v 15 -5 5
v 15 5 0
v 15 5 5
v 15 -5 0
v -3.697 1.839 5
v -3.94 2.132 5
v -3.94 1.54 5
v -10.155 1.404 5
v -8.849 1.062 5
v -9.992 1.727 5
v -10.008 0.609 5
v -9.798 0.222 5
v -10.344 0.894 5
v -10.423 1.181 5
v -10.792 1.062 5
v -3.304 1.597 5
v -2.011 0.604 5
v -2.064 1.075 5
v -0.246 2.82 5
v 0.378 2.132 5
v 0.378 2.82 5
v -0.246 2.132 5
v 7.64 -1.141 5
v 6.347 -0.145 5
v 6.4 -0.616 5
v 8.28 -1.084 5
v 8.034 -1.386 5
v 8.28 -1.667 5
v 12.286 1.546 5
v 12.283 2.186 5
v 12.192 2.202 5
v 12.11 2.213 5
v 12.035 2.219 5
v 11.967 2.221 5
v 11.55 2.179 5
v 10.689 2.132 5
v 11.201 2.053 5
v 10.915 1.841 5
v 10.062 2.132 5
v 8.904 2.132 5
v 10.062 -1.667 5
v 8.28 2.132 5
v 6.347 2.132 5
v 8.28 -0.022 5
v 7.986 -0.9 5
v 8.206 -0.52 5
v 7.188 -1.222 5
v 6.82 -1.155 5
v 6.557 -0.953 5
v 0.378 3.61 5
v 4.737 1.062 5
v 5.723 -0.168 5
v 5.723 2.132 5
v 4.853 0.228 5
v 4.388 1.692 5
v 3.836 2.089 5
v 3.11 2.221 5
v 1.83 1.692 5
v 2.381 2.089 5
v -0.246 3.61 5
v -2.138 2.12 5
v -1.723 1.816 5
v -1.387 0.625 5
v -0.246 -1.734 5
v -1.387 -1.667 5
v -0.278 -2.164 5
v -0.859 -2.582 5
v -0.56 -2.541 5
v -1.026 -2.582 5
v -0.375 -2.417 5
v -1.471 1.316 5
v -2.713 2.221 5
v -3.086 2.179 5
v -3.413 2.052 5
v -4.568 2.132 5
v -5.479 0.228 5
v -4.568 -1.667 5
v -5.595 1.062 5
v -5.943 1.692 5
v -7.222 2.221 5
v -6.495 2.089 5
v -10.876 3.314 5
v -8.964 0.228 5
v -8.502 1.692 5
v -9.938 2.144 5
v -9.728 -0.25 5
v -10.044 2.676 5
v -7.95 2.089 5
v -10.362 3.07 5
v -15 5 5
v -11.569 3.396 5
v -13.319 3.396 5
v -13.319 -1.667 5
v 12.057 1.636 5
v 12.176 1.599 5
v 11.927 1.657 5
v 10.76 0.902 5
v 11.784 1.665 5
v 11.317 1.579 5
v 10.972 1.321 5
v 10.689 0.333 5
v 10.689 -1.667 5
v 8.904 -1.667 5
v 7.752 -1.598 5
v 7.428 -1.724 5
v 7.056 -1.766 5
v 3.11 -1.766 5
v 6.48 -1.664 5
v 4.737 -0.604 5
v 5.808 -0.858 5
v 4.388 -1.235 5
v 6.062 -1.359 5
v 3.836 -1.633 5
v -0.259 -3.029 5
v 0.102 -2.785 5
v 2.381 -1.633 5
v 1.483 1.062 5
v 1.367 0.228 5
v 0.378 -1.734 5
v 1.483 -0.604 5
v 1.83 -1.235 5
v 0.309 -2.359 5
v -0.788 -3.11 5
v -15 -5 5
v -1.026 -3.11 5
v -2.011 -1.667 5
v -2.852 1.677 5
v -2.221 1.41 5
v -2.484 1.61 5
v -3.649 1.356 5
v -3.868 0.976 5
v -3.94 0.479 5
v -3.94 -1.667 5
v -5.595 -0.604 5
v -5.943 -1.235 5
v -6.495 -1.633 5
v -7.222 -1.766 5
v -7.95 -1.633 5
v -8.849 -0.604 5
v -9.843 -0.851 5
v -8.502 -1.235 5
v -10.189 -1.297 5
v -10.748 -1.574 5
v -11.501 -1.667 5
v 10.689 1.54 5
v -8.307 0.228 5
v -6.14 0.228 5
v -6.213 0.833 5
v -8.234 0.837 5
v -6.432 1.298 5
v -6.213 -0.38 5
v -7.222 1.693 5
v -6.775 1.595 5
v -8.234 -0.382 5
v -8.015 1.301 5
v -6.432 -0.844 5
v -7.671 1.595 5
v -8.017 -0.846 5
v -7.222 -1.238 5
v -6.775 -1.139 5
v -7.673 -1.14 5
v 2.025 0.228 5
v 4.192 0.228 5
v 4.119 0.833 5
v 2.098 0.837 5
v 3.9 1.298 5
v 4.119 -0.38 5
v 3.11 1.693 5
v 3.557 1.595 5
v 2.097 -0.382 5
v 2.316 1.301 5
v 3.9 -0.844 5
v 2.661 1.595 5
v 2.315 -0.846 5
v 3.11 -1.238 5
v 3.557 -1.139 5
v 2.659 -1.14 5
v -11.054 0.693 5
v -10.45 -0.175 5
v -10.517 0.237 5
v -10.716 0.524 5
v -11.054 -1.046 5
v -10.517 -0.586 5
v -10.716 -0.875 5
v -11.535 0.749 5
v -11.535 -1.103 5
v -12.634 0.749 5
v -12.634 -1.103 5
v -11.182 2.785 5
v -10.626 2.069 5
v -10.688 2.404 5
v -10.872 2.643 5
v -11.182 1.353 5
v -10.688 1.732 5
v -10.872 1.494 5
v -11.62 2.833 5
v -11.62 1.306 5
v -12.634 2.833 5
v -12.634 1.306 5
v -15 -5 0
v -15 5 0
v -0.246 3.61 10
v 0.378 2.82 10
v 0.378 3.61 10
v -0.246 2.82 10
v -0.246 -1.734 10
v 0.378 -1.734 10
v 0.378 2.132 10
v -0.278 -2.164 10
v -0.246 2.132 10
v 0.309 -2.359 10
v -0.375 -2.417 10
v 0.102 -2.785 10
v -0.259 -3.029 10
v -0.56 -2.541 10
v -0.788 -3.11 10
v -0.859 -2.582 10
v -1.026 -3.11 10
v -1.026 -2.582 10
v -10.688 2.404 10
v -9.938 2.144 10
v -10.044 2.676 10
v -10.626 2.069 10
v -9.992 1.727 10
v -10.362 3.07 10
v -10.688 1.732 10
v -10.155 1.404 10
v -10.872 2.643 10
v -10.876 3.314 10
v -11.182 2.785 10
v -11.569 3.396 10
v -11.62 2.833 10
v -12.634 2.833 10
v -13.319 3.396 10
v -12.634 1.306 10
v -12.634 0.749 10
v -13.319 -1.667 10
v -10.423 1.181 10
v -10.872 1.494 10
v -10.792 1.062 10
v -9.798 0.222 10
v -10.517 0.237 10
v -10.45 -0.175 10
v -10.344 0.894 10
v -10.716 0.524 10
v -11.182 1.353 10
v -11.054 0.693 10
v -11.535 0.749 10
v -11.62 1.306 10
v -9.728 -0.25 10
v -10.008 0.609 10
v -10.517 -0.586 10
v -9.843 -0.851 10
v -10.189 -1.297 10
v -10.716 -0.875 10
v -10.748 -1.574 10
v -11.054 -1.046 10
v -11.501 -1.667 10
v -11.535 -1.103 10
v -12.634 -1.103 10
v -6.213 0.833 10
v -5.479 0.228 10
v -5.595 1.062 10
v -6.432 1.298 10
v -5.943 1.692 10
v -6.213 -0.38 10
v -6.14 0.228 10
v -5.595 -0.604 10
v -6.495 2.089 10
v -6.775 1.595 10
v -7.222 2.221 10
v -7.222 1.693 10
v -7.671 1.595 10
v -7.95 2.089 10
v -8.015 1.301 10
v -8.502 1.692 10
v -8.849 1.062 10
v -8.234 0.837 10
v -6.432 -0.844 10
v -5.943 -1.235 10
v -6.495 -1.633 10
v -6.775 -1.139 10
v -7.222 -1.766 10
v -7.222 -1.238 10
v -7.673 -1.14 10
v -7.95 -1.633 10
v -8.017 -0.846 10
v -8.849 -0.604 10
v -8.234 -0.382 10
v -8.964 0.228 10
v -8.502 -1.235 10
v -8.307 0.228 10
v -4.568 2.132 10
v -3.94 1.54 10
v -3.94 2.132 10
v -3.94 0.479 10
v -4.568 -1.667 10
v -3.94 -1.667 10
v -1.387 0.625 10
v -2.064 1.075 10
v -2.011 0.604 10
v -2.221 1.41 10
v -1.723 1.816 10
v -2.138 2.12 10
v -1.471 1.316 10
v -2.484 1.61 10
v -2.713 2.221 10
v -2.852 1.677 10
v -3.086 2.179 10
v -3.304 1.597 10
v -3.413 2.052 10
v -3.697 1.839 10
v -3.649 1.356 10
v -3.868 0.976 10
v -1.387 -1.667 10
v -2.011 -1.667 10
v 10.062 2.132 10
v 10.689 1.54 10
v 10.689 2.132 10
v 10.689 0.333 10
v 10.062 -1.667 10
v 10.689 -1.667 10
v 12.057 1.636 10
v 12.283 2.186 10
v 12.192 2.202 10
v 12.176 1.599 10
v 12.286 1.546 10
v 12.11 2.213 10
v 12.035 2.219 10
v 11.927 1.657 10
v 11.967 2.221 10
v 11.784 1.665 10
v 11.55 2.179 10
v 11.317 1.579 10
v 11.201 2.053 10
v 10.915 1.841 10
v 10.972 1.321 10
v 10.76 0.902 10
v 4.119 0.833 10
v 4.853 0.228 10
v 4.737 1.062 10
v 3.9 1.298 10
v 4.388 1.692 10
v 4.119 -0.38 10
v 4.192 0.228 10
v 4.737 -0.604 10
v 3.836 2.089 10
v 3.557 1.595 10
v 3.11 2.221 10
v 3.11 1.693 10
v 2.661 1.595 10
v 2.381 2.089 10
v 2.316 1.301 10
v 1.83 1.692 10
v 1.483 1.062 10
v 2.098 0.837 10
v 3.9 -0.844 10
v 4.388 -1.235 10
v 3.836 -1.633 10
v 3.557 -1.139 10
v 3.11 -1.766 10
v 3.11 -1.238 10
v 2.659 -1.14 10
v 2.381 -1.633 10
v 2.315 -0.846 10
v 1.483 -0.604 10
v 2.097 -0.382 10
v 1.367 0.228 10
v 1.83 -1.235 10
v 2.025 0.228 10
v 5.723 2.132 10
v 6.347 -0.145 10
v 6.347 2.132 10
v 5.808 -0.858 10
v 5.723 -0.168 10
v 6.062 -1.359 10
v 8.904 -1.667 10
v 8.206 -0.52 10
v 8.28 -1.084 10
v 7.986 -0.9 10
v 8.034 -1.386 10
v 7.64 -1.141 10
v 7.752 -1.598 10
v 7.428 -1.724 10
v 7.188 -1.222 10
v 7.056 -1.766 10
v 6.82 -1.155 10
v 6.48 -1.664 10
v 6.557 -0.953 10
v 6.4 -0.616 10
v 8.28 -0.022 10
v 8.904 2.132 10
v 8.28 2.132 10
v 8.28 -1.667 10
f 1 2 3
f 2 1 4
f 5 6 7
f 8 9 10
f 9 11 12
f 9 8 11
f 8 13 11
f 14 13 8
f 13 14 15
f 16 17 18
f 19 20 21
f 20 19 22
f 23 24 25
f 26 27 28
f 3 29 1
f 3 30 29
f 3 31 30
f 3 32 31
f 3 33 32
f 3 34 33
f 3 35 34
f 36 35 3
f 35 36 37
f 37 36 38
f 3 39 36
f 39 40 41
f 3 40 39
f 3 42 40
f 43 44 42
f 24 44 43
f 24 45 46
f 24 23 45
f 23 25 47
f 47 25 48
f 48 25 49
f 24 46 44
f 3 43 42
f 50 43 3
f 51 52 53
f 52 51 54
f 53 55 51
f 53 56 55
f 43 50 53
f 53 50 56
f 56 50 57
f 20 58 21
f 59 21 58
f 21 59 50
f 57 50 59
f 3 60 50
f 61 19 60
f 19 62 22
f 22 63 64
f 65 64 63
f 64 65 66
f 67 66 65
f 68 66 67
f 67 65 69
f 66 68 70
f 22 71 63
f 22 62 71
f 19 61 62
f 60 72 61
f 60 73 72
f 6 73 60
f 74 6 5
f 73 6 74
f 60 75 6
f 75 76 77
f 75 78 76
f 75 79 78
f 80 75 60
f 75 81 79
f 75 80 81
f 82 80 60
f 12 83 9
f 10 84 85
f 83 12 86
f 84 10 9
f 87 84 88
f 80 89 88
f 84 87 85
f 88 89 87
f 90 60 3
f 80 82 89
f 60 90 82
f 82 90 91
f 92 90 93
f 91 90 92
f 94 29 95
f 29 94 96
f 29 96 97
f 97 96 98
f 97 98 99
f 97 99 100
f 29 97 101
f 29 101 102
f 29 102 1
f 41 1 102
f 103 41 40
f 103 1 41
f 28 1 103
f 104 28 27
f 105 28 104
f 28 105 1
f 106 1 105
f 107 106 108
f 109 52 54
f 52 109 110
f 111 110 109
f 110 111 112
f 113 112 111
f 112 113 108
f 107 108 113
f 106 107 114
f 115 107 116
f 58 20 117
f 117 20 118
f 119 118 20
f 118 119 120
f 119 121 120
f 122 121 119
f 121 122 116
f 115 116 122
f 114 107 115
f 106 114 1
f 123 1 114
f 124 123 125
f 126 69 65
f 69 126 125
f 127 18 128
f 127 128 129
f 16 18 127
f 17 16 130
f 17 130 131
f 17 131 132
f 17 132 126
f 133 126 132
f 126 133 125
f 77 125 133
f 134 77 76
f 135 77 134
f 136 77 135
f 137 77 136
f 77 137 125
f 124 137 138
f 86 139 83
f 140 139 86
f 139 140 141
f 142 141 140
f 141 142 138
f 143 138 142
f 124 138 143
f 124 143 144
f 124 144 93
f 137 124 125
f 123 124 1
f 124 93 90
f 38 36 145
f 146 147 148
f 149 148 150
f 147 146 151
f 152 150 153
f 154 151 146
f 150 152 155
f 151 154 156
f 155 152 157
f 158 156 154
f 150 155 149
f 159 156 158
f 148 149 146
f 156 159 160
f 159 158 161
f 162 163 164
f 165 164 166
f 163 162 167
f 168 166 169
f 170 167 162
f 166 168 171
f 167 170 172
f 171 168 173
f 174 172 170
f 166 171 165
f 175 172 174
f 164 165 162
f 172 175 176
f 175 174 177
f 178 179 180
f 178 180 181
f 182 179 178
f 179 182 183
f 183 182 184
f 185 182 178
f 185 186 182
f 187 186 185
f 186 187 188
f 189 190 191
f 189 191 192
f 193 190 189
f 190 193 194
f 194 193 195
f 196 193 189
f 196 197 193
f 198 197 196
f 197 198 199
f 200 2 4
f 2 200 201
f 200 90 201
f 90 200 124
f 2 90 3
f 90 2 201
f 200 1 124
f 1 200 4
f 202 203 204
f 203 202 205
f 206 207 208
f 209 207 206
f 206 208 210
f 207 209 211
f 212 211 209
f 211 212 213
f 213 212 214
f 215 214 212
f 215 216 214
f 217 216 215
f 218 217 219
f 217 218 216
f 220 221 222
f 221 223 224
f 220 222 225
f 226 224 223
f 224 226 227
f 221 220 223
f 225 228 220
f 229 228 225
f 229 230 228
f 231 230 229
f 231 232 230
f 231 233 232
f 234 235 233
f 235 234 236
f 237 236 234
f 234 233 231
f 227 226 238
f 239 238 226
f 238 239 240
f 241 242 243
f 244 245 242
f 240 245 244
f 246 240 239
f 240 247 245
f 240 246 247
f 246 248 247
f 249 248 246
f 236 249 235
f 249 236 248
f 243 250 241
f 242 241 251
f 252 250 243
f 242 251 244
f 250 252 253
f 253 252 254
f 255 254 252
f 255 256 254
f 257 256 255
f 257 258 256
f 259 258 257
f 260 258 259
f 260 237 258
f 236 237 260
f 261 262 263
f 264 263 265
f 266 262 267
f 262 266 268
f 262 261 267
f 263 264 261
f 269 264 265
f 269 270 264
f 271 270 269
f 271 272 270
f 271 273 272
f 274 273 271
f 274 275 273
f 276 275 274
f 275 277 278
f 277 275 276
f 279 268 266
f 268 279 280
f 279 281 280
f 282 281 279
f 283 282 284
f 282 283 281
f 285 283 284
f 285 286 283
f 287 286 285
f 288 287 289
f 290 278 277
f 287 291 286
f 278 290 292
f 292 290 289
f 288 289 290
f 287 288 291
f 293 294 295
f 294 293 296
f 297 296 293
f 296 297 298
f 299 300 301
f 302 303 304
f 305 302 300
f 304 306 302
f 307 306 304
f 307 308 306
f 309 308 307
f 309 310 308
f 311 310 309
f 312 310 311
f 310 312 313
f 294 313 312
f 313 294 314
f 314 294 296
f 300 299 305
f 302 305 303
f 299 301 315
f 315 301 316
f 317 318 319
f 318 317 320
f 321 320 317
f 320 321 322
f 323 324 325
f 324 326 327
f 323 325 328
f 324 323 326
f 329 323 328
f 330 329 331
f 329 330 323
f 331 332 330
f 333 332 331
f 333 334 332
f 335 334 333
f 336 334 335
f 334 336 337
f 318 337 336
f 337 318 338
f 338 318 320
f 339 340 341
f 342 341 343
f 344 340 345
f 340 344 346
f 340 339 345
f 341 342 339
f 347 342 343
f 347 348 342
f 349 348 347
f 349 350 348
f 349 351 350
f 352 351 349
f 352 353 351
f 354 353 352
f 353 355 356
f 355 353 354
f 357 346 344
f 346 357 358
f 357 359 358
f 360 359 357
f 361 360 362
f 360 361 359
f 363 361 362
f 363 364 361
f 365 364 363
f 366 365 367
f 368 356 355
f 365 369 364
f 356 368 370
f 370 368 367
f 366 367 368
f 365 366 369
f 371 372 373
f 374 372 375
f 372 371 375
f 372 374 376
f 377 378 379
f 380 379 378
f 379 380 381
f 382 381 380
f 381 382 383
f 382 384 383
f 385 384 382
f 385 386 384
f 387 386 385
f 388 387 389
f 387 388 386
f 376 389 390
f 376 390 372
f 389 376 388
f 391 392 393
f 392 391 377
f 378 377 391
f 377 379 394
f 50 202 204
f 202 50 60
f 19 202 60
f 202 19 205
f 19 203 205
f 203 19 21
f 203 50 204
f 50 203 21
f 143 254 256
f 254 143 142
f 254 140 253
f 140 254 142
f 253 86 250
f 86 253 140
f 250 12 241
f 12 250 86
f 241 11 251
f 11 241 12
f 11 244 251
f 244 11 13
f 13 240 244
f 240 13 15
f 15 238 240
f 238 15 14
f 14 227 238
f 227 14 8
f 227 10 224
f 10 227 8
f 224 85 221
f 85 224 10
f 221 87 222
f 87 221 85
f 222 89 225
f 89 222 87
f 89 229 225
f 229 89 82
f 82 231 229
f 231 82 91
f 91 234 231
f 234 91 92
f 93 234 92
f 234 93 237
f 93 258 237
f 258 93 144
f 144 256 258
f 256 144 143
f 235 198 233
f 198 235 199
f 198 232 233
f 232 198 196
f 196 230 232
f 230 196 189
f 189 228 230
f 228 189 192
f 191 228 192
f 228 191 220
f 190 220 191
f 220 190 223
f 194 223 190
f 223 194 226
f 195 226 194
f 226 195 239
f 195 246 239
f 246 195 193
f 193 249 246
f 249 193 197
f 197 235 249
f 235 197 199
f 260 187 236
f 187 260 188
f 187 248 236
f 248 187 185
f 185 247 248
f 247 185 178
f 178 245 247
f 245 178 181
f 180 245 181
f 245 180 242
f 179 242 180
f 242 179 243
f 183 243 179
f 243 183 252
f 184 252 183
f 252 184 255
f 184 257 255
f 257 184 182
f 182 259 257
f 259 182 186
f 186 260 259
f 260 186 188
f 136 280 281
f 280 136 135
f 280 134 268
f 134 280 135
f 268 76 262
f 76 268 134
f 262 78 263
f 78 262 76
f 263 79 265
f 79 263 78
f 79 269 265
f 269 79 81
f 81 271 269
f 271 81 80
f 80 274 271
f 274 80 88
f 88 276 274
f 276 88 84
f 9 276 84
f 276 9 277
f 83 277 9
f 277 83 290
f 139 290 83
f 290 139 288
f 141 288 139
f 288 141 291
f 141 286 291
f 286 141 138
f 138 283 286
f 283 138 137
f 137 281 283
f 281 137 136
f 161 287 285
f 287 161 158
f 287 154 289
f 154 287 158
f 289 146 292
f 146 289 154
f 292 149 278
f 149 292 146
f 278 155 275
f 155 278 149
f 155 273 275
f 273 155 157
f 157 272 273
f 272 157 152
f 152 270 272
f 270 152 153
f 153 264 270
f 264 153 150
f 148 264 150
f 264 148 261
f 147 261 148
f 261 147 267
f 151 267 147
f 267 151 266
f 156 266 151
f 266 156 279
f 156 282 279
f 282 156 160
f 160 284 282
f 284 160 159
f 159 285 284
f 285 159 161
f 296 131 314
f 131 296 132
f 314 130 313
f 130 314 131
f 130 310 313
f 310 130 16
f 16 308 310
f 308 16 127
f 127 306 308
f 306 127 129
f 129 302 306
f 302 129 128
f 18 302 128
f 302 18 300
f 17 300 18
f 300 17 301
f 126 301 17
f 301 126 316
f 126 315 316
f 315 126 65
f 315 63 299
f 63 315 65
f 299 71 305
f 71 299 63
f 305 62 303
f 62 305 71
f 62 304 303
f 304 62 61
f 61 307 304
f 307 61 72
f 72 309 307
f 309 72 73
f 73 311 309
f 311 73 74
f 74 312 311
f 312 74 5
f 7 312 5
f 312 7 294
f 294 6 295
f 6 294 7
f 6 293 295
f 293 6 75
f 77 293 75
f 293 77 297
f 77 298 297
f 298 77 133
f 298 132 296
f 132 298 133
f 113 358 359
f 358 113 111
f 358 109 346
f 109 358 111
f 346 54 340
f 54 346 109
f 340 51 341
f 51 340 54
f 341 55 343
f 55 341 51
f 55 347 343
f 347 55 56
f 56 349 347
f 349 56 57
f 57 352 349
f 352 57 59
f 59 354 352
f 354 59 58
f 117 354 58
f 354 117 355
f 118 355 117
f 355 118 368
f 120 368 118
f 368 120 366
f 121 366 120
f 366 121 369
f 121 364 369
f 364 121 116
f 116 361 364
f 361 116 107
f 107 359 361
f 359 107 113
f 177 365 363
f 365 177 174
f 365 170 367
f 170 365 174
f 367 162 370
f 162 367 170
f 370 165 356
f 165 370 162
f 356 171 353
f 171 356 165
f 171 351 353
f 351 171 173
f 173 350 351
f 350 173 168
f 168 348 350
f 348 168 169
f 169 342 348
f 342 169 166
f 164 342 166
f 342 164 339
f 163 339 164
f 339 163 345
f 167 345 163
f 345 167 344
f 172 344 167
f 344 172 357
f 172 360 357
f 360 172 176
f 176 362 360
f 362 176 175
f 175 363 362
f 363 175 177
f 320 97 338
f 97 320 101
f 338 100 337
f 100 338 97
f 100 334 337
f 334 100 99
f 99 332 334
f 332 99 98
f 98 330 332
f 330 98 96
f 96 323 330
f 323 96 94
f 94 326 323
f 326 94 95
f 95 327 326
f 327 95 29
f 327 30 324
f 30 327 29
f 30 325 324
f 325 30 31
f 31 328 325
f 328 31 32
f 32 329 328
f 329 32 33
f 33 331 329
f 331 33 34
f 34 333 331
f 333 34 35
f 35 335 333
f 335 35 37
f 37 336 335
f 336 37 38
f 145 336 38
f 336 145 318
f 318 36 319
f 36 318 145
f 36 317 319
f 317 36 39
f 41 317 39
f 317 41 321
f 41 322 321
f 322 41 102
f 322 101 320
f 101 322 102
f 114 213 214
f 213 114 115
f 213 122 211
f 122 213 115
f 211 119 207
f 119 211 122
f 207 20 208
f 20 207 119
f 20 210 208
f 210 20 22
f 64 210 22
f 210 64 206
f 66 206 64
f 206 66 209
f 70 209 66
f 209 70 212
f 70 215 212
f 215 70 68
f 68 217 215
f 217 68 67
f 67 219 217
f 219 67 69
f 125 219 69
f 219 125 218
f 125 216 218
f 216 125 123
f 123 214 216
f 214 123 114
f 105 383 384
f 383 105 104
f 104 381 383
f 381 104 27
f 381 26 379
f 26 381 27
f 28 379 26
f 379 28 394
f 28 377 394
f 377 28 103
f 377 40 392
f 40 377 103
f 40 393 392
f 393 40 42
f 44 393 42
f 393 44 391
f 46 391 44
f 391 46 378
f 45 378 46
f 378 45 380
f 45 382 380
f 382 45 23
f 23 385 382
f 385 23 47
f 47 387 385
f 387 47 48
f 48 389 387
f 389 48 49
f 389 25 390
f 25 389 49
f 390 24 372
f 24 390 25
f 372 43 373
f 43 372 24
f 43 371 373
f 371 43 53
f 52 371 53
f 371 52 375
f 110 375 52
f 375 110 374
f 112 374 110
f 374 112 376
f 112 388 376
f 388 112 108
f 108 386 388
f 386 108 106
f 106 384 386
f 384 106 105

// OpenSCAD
$fn = 3; 
texte_a_inserer = "Bonjour"; 
taille = 5; 
police = "DejaVuSans"; //[[Abril Fatface,Aclonica,Acme,Advent Pro,Akronim,Aladin,Alegreya,Alegreya Sans,Alegreya SC,Alex Brush,Alfa Slab One,Alice,Amaranth,Architects Daughter,Archivo Black,Archivo Narrow,Arimo,Arvo,Asap,Astloch,Asul,Averia Libre,Averia Serif Libre,Bangers,Basic,Belgrano,Berkshire Swash,Bigshot One,Bilbo Swash Caps,Black Ops One,Bonbon,Bowlby One SC,Brawler,Bubblegum Sans,Butterfly Kids,Cabin Condensed,Caesar Dressing,Cagliostro,Calligraffitti,Capriola,Carter One,Changa One,Chango,Chelsea Market,Cherry Cream Soda,Chewy,Chicle,Chivo,Clicker Script,Coming Soon,Concert One,Condiment,Cookie,Courgette,Covered By Your Grace,Crimson Text,Dancing Script,DejaVu Sans,DejaVu Serif,Dhurjati,Doppio One,Dosis,Droid Sans,Eagle Lake,Electrolize,Emilys Candy,Encode Sans,Encode Sans Compressed,Euphoria Script,Exo,Exo 2,Faster One,Federo,Finger Paint,Fjord One,Fontdiner Swanky,Freckle Face,Fruktur,Gabriela,Geo,Germania One,Give You Glory,Gloria Hallelujah,Goudy Bookletter 1911,Graduate,Grand Hotel,Great Vibes,Griffy,Hanalei Fill,Happy Monkey,Henny Penny,Hind,IM Fell English SC,Indie Flower,Irish Grover,Italianno,Jacques Francois Shadow,Jolly Lodger,Josefin Slab,Joti One,Judson,Just Another Hand,Kalam,Kameron,Karma,Kavoon,Knewave,Kranky,Kristi,Laila,Lakki Reddy,Lancelot,Lato,Leckerli One,Ledger,Lekton,Lemon One,Liberation Sans,Libre Caslon Text,Life Savers,Lilita One,Lily Script One,Limelight,Lobster,Lobster Two,Londrina Outline,Londrina Shadow,Londrina Solid,Lora,Love Ya Like A Sister,Loved by the King,Lovers Quarrel,Luckiest Guy,Lusitana,Macondo,Macondo Swash Caps,Mako,Marck Script,Margarine,Marko One,Maven Pro,McLaren,MedievalSharp,Merienda One,Merriweather,Mervale Script,Metal Mania,Metrophobic,Milonga,Miltonian Tattoo,Miss Fajardose,Molle,Montez,Montserrat,Mr De Haviland,Mystery Quest,Neucha,New Rocker,Niconne,Nosifer,Nothing You Could Do,Noto Sans Oriya,Noto Serif,Nova Square,Nunito,Old Standard TT,Oleo Script,Oleo Script Swash Caps,Orbitron,Oregano,Orienta,Original Surfer,Oswald,Over the Rainbow,Overlock,Oxygen,Pacifico,Paprika,Parisienne,Patrick Hand SC,Paytone One,Peralta,Permanent Marker,Piedra,Pirata One,Play,Playball,Poetsen One,Poppins,Press Start 2P,Princess Sofia,PT Mono,Qwigley,Racing Sans One,Raleway,Rancho,Ranga,Ribeye,Roboto,Roboto Condensed,Roboto Slab,Rochester,Rock Salt,Rubik One,Sail,Salsa,Sansita One,Sarina,Satisfy,Schoolbell,Seaweed Script,Sevillana,Shadows Into Light,Shadows Into Light Two,Share,Six Caps,Skranji,Source Sans Pro,Spicy Rice,Stardos Stencil,Stoke,Syncopate,Teko,Terminal Dosis,The Girl Next Door,Tillana,Timmana,Titillium Web,Ubuntu,Ultra,Underdog,UnifrakturCook,UnifrakturMaguntia,Vampiro One,Vidaloka,Viga,Voces,Volkhov,Vollkorn,Voltaire,Waiting for the Sunrise,Wallpoet,Wellfleet,Wendy One,Yellowtail,Yesteryear,Zeyada]]
hauteur = 5; 
longueur_cube = 30; 
largeur_cube = 10; 
hauteur_cube = 5; 
relief_extrusion = "relief"; //[relief,extru]
module rendu(){
linear_extrude(hauteur) text(texte_a_inserer,size = taille, font = police);
}
module finao(){
if ( relief_extrusion == "relief") {
   union(){
 translate([0,0,0])   cube([longueur_cube,largeur_cube,hauteur_cube]);
translate([1,(largeur_cube/3),hauteur_cube]) rendu();
   } 
}
else
{
difference(){
 translate([0,0,0])   cube([longueur_cube,largeur_cube,hauteur_cube]);
translate([1,(largeur_cube/3),(hauteur_cube -hauteur+0.1)]) rendu();
}
 }
}
translate ([-(longueur_cube/2),-(largeur_cube/2),0]) finao();
